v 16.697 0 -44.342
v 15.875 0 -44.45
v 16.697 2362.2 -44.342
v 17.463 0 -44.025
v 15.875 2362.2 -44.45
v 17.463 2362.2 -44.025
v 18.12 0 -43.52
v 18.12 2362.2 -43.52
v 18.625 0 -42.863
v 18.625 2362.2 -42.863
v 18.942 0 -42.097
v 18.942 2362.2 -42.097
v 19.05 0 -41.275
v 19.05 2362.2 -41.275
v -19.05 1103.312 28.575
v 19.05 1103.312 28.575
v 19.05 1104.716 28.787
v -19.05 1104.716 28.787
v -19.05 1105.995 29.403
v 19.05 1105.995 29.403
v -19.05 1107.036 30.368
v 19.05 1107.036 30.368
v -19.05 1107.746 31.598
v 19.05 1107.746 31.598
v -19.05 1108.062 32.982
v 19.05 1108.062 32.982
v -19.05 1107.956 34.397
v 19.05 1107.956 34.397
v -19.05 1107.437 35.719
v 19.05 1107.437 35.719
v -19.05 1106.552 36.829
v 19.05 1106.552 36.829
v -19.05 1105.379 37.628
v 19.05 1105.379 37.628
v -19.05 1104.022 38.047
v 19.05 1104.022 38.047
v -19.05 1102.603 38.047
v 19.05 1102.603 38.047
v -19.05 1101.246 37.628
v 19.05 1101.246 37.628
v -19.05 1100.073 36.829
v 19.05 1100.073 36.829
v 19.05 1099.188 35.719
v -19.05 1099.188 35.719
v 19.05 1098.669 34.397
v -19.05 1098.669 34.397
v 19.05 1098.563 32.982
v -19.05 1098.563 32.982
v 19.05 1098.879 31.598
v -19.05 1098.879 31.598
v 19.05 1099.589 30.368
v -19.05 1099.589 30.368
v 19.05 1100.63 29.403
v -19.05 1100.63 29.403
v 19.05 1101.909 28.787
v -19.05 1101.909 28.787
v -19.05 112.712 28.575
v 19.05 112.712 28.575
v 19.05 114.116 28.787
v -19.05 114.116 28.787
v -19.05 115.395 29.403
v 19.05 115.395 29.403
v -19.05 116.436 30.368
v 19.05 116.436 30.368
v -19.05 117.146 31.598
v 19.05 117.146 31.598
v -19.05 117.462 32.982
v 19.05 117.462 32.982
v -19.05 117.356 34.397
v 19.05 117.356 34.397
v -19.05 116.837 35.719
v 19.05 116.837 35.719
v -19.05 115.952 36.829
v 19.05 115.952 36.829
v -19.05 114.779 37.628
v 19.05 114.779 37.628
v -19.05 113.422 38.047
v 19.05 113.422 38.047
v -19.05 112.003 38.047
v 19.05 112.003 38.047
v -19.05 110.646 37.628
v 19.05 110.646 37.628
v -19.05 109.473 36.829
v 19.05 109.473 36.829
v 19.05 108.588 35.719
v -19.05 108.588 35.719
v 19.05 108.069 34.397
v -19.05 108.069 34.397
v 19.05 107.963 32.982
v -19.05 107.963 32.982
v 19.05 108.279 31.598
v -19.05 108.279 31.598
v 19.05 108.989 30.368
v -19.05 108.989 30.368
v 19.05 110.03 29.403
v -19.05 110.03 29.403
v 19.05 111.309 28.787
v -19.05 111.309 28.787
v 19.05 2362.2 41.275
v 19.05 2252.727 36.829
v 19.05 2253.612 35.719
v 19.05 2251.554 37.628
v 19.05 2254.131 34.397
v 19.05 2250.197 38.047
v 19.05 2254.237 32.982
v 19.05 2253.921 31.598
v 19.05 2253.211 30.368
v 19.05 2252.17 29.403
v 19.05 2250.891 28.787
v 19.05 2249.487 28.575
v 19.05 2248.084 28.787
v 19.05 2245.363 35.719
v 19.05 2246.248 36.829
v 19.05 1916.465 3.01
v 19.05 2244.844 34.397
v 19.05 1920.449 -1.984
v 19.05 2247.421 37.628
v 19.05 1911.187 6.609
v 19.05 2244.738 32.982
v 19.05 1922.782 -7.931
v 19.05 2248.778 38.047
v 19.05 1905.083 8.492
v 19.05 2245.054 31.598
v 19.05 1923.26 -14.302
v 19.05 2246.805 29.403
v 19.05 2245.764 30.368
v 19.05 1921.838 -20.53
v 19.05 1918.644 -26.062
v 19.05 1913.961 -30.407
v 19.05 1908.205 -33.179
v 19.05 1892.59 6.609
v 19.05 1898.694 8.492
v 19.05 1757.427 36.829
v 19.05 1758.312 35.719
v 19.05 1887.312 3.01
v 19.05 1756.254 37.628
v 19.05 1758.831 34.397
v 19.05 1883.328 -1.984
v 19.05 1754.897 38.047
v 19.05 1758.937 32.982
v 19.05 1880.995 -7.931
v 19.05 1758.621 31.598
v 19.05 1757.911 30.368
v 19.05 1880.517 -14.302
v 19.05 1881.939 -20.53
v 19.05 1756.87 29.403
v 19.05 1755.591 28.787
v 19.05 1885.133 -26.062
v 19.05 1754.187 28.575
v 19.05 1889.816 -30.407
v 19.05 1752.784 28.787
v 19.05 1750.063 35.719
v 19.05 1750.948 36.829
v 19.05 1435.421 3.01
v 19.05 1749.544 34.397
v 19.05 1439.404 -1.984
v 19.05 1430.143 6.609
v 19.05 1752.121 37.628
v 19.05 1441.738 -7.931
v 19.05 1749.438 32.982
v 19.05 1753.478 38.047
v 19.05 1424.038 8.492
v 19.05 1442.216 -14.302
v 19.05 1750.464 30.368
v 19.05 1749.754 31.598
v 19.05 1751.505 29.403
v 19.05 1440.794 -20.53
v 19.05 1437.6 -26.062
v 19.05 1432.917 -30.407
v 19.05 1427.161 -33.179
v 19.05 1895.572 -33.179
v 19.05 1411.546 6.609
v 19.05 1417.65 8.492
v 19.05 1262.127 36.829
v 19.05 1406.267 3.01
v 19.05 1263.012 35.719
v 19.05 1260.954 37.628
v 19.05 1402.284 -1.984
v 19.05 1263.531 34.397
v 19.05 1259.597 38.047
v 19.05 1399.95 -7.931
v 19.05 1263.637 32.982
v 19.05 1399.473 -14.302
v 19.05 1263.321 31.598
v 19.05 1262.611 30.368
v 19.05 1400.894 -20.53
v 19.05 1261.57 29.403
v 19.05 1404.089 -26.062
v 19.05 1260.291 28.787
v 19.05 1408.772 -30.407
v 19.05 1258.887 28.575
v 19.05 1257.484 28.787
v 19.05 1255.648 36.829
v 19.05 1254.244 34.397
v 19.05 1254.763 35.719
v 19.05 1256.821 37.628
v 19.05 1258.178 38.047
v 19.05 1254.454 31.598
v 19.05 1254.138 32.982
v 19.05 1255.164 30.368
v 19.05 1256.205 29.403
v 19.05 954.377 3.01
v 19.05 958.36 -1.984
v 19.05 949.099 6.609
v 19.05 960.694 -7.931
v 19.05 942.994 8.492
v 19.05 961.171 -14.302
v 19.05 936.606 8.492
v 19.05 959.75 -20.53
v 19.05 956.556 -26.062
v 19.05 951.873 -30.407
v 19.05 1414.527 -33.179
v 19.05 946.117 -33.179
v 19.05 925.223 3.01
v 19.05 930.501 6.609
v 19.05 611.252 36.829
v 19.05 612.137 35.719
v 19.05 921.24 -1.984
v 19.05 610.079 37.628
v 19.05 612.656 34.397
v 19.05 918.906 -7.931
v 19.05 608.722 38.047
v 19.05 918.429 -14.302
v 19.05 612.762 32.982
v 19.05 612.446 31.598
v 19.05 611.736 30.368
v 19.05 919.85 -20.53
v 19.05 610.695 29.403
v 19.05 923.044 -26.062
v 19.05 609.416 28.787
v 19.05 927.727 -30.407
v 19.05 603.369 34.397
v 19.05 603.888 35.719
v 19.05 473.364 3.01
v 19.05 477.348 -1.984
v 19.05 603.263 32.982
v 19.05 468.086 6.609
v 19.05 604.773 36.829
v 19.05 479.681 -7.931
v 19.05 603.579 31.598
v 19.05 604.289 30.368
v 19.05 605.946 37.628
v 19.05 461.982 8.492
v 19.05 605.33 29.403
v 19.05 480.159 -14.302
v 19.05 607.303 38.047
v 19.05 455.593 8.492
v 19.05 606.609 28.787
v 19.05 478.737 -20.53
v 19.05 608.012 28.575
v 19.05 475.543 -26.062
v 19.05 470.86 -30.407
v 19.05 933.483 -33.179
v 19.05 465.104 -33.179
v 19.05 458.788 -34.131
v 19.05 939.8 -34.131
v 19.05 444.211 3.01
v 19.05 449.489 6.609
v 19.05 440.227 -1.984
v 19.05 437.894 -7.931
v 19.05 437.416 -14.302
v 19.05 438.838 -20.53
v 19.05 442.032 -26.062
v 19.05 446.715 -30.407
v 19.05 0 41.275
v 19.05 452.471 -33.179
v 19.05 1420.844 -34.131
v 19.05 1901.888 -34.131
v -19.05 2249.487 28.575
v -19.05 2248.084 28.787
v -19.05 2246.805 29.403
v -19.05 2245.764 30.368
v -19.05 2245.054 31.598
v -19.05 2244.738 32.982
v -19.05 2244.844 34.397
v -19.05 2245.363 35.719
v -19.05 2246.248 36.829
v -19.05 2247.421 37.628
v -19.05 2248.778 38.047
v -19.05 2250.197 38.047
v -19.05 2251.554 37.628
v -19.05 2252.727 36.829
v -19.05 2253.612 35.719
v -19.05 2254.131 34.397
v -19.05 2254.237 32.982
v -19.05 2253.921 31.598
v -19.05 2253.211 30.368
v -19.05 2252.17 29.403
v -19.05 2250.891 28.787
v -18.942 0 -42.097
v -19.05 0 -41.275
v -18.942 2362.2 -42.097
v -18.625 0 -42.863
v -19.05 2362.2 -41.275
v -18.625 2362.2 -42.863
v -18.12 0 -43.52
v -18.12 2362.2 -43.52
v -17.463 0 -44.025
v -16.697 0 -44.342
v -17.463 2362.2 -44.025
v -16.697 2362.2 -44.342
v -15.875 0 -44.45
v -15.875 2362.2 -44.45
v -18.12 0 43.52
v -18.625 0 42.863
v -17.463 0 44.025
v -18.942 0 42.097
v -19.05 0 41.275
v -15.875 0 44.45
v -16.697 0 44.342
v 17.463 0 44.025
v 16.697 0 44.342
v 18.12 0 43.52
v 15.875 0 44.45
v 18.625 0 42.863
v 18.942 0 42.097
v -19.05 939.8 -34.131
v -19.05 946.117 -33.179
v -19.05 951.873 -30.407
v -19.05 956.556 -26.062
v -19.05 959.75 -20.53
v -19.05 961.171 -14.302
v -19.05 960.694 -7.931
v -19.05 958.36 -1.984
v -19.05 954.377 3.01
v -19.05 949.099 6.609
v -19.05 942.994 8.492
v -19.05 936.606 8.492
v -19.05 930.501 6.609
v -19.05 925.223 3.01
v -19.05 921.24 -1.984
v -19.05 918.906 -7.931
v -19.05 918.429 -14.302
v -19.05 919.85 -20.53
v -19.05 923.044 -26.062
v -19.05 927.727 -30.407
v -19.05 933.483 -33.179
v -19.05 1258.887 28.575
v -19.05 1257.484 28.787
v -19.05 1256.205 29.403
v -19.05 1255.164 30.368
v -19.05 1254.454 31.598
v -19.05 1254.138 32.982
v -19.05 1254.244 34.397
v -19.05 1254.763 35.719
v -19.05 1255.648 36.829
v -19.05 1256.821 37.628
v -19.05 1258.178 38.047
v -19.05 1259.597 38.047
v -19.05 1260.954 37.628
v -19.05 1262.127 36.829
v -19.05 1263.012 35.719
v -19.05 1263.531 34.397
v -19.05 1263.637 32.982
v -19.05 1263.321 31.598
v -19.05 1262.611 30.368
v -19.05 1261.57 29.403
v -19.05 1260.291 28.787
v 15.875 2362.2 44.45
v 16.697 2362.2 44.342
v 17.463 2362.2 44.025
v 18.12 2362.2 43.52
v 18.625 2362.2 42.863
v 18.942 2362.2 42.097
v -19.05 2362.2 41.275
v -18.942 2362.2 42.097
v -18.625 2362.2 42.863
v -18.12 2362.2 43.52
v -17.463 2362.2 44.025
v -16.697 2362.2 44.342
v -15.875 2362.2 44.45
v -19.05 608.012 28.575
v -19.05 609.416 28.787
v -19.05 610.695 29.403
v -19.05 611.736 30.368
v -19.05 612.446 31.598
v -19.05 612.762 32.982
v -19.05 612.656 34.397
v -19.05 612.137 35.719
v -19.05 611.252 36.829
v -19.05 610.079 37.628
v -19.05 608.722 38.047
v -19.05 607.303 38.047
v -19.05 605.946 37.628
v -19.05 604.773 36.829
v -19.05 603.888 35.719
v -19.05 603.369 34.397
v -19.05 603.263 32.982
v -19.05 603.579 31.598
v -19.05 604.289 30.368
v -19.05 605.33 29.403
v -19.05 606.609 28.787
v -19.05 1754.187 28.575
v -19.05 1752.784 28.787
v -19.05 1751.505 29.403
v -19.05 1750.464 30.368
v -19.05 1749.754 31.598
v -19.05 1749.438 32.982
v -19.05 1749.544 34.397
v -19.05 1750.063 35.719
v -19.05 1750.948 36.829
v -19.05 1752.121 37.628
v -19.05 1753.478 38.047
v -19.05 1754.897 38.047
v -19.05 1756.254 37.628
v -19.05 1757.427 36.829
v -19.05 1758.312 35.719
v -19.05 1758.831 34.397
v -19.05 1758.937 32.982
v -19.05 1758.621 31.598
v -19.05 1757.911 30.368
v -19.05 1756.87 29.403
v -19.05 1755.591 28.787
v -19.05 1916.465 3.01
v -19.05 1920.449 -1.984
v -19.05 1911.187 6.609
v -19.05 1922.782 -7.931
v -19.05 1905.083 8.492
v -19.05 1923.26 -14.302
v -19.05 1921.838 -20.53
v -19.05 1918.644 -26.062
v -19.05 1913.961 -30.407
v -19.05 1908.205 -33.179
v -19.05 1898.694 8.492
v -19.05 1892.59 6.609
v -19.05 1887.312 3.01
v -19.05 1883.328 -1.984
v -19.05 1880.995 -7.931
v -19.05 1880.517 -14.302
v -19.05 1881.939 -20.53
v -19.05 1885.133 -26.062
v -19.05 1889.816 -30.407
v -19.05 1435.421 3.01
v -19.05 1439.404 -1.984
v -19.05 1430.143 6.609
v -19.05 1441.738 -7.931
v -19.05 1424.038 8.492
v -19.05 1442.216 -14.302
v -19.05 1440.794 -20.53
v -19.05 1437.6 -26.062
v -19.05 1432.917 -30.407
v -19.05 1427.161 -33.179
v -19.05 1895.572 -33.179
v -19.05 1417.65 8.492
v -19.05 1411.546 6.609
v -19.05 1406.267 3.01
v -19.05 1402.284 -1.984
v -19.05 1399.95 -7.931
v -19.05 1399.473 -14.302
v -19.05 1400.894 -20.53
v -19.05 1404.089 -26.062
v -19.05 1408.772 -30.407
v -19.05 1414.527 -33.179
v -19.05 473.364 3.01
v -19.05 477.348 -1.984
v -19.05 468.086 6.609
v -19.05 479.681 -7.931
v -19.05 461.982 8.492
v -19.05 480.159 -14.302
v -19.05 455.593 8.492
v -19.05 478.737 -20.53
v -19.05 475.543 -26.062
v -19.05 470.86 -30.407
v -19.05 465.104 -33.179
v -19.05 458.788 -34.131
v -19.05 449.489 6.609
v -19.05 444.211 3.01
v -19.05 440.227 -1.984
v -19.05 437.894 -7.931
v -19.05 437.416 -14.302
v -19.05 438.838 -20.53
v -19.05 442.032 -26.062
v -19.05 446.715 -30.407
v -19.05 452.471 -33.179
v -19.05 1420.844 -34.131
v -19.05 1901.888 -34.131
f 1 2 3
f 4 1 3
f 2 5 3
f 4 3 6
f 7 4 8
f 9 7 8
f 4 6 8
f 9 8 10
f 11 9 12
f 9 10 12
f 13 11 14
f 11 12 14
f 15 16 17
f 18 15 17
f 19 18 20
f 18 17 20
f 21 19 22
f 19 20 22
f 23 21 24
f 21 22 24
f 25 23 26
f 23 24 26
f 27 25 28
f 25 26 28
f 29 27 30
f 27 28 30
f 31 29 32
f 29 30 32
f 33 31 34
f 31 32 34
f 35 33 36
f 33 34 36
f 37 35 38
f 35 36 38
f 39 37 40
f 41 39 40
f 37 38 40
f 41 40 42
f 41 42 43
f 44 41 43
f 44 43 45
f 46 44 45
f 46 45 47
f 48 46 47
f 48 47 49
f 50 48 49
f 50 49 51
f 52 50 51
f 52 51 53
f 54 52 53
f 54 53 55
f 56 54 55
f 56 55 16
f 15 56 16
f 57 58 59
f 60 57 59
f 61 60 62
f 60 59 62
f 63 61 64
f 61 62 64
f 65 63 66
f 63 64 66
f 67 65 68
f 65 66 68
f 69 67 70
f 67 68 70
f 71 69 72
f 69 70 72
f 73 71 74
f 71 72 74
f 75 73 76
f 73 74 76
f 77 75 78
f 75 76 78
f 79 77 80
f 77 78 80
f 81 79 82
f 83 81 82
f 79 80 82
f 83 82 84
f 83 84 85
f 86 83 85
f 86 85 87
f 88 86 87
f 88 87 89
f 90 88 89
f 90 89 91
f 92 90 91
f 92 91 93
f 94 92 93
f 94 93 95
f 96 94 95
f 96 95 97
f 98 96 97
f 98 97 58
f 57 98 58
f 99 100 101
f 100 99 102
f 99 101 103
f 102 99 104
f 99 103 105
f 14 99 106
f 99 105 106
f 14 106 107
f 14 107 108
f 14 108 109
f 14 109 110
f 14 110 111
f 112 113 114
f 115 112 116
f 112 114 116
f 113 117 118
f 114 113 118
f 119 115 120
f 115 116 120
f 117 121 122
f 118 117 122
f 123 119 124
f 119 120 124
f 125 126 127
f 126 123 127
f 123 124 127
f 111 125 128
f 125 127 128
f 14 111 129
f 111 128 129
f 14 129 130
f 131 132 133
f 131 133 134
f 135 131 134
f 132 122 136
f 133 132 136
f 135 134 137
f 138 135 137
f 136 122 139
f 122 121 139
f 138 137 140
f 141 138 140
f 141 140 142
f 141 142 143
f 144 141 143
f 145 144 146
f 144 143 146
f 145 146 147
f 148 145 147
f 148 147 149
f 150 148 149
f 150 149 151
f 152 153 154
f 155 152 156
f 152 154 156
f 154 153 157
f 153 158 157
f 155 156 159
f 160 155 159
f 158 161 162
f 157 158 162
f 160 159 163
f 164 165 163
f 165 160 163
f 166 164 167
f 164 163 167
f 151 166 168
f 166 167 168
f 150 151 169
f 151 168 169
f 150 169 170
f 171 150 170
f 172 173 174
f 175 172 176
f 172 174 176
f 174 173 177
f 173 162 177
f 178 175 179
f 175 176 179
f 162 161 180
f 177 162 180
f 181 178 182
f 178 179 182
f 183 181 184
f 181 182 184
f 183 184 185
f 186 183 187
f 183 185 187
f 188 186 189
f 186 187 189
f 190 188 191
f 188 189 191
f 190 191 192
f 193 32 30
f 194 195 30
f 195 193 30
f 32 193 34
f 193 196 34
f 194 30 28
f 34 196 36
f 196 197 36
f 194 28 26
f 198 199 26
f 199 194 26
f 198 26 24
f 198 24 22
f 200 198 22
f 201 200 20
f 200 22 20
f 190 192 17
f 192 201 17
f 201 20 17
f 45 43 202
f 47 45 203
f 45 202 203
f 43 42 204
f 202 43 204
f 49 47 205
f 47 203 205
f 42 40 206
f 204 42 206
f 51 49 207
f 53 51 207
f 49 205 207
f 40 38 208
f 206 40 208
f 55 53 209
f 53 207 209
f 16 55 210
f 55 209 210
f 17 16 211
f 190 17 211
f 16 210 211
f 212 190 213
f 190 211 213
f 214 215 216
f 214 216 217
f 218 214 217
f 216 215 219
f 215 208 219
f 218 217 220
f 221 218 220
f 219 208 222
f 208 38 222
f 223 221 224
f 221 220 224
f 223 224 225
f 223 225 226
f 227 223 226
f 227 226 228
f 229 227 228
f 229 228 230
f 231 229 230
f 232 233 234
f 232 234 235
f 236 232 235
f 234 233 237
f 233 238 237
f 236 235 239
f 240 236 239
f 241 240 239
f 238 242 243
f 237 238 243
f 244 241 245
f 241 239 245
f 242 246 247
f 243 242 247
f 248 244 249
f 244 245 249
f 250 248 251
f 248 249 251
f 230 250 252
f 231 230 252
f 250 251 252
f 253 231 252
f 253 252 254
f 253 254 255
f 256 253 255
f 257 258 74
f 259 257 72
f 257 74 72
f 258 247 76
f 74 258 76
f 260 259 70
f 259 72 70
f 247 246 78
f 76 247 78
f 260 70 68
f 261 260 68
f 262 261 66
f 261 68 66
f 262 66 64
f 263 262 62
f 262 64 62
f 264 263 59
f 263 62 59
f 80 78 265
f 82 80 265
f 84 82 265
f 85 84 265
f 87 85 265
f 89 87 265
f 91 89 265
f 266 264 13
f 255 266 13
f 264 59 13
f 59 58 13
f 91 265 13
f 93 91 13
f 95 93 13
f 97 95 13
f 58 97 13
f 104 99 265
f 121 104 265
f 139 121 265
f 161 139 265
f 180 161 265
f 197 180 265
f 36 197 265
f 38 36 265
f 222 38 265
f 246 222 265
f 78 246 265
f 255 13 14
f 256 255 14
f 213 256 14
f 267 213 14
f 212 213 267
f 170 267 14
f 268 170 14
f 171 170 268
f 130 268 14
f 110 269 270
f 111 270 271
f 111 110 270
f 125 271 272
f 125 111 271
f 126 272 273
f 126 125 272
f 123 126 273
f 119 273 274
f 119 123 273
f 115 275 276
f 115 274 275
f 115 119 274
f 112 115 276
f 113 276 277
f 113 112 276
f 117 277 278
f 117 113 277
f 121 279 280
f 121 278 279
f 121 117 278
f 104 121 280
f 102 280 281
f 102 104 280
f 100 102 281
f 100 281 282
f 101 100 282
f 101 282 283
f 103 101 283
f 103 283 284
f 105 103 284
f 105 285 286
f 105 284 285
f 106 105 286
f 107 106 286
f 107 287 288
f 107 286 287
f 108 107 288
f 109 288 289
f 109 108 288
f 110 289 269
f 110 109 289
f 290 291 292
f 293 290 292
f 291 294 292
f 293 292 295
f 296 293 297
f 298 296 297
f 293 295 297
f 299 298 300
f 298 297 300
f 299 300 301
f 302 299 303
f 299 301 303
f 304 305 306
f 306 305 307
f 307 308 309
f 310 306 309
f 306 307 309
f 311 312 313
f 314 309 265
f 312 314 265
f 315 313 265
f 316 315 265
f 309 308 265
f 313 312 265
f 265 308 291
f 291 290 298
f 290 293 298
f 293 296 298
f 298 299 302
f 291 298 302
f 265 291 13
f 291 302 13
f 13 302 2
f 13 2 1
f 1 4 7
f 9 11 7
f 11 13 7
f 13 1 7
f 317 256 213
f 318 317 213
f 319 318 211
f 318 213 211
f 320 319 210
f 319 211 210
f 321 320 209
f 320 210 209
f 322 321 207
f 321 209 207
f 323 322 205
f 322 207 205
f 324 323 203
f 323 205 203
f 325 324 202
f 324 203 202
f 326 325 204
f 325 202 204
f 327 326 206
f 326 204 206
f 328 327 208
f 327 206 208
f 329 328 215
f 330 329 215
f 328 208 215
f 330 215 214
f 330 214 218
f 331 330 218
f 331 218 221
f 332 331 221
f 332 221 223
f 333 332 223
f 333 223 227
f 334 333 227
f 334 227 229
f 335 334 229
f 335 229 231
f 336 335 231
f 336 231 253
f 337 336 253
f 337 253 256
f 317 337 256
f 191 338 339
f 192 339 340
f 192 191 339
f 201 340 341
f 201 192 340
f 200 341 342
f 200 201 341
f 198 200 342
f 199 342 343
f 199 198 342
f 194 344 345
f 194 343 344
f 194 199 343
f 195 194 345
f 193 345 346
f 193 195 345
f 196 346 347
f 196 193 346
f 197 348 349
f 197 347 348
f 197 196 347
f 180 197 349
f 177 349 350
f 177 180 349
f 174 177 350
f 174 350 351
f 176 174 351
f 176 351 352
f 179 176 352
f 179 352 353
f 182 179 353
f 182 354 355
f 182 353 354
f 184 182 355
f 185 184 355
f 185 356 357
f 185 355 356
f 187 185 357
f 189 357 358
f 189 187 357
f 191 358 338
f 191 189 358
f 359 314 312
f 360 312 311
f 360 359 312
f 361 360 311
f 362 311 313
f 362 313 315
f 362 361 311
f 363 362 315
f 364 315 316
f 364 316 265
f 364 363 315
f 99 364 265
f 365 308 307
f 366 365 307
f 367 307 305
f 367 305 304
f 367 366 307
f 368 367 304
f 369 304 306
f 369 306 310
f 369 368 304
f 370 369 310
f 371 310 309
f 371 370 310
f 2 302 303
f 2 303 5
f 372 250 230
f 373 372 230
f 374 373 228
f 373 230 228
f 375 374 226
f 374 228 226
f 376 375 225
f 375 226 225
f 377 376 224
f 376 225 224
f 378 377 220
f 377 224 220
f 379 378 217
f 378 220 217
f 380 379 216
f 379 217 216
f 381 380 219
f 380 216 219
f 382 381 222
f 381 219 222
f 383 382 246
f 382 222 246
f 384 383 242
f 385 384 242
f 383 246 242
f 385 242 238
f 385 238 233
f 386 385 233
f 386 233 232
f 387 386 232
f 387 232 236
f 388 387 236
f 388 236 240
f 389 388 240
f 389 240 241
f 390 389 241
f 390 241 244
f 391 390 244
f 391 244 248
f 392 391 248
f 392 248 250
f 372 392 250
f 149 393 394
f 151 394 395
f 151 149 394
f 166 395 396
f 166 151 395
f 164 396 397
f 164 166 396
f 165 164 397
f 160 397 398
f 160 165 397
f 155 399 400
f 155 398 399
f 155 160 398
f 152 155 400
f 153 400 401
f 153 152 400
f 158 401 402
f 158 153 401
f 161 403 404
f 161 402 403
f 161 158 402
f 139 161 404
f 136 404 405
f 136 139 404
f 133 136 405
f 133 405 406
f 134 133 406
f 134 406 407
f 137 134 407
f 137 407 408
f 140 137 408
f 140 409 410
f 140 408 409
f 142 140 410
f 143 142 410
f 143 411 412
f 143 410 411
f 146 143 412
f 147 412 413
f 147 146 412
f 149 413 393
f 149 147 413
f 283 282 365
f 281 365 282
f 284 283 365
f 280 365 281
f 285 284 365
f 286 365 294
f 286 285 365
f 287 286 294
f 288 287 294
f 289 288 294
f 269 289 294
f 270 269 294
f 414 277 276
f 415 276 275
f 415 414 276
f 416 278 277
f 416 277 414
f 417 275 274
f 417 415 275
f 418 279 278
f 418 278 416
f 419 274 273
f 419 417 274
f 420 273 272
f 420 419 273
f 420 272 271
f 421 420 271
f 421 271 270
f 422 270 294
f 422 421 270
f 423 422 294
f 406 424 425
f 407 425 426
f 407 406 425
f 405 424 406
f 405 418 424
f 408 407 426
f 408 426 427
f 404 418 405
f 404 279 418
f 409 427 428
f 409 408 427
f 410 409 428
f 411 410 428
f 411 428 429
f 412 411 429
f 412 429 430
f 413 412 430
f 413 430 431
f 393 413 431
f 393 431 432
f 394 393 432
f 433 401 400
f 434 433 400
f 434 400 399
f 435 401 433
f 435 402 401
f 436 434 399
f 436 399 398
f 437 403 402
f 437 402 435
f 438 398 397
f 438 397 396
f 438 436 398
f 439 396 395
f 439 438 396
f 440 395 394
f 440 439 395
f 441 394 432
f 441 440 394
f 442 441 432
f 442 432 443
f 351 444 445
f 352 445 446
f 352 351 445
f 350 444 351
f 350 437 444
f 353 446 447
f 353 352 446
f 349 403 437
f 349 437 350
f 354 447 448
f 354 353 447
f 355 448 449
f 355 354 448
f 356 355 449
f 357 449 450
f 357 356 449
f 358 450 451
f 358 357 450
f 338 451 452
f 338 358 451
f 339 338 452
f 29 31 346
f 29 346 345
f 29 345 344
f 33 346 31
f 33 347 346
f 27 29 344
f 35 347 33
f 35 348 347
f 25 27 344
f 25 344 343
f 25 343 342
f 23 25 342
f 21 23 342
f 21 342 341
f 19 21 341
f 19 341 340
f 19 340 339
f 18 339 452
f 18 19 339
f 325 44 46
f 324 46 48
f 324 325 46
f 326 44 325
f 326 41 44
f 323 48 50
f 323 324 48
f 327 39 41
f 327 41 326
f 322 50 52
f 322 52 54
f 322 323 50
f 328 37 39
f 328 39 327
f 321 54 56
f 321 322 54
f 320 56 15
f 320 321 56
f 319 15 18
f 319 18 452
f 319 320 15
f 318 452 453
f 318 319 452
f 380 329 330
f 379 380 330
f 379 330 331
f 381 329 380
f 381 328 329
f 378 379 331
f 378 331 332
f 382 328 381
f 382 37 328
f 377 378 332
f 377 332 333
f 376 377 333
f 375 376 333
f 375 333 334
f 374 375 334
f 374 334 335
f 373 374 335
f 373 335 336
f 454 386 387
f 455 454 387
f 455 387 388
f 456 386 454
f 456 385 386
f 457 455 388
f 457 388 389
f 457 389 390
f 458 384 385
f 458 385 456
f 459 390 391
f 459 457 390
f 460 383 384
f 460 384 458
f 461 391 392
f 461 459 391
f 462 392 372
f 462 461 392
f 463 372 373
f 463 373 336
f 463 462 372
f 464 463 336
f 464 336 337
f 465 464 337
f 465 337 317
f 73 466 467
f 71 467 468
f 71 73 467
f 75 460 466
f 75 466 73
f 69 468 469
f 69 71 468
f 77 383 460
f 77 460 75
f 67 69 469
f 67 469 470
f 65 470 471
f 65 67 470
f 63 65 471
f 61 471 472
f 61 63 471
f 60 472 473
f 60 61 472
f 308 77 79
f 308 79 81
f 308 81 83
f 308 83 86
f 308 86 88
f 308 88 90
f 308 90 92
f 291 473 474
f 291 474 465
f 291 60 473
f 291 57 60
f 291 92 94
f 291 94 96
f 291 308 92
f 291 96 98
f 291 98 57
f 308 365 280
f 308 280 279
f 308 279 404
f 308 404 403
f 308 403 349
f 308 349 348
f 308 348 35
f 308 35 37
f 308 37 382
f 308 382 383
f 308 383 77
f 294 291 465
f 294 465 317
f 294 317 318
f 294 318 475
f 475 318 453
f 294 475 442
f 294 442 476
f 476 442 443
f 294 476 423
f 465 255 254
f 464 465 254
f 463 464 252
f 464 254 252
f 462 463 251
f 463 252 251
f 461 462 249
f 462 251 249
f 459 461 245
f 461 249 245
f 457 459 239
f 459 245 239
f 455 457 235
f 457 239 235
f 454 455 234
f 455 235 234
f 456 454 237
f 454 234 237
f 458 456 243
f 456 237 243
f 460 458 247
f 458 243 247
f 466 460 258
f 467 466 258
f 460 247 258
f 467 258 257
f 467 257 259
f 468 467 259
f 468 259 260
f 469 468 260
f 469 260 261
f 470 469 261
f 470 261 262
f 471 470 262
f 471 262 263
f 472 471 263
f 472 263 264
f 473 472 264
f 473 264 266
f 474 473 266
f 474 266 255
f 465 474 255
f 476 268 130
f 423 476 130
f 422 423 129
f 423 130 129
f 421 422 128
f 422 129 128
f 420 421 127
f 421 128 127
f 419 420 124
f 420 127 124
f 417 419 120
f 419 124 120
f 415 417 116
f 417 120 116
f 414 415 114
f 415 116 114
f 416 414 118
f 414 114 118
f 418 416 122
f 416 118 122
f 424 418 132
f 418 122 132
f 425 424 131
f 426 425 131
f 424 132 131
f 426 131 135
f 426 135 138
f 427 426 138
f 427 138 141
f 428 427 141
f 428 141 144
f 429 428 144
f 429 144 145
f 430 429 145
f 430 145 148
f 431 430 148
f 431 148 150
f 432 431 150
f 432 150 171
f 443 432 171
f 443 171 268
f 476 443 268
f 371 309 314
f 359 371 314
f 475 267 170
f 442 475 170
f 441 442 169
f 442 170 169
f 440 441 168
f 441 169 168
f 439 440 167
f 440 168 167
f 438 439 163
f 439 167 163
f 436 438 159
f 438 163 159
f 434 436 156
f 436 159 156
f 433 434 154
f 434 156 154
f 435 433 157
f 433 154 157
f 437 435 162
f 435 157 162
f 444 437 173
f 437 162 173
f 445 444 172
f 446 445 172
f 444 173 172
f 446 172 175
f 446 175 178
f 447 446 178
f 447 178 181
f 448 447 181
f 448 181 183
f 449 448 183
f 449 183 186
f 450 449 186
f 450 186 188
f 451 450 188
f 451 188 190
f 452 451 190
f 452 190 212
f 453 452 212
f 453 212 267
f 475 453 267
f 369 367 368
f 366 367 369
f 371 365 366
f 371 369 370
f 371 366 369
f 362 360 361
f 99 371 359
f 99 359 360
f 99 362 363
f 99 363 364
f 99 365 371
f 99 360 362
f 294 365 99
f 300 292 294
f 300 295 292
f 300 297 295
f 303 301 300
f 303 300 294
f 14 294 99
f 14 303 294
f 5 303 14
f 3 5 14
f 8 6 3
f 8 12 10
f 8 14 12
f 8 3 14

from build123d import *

# Parameters (mm, degrees)
SKETCH1_W           = 38.1
SKETCH1_H           = 88.9
BOSS_EXTRUDE1_DEPTH = 2362.2
SKETCH2_R           = 21.43125
CUT_EXTRUDE4_DEPTH  = 918.6545
SKETCH3_R           = 4.7625
CUT_EXTRUDE5_DEPTH  = 2363.925359062
FILLET1_R           = 3.175


with BuildPart() as part:
    # Sketch1 → Boss-Extrude1 (new body)
    with BuildSketch(Plane(origin=(0, 0, 0), x_dir=(1, 0, 0), z_dir=(0, 1, 0))):
        Rectangle(SKETCH1_W, SKETCH1_H)
    extrude(amount=BOSS_EXTRUDE1_DEPTH)

    # Sketch2 → Cut-Extrude4 (cut)
    with BuildSketch(Plane(origin=(19.05, 0, 0), x_dir=(0, 0, -1), z_dir=(1, 0, 0))):
        with Locations((12.7, 458.7875)):
            Circle(SKETCH2_R)
        with Locations((12.7, 939.8)):
            Circle(SKETCH2_R)
        with Locations((12.7, 1420.84425)):
            Circle(SKETCH2_R)
        with Locations((12.7, 1901.8885)):
            Circle(SKETCH2_R)
    extrude(amount=-CUT_EXTRUDE4_DEPTH, mode=Mode.SUBTRACT)

    # Sketch3 → Cut-Extrude5 (cut, through all)
    with BuildSketch(Plane(origin=(19.05, 0, 0), x_dir=(0, 0, -1), z_dir=(1, 0, 0))):
        with Locations((-33.3375, 112.7125)):
            Circle(SKETCH3_R)
        with Locations((-33.3375, 608.0125)):
            Circle(SKETCH3_R)
        with Locations((-33.3375, 1103.3125)):
            Circle(SKETCH3_R)
    cut_extrude5 = extrude(amount=-CUT_EXTRUDE5_DEPTH, mode=Mode.SUBTRACT)

    # Fillet1
    fillet1_edges = [part.edges().sort_by_distance(p)[0] for p in [
        (19.05, 1181.1, 44.45),
        (-19.05, 1181.1, 44.45),
        (-19.05, 1181.1, -44.45),
        (19.05, 1181.1, -44.45),
    ]]
    fillet(fillet1_edges, radius=FILLET1_R)

    # Mirror1: Cut-Extrude5 across plane
    add(cut_extrude5.mirror(Plane.ZX.offset(1181.1)), mode=Mode.SUBTRACT)


solid = part.part
